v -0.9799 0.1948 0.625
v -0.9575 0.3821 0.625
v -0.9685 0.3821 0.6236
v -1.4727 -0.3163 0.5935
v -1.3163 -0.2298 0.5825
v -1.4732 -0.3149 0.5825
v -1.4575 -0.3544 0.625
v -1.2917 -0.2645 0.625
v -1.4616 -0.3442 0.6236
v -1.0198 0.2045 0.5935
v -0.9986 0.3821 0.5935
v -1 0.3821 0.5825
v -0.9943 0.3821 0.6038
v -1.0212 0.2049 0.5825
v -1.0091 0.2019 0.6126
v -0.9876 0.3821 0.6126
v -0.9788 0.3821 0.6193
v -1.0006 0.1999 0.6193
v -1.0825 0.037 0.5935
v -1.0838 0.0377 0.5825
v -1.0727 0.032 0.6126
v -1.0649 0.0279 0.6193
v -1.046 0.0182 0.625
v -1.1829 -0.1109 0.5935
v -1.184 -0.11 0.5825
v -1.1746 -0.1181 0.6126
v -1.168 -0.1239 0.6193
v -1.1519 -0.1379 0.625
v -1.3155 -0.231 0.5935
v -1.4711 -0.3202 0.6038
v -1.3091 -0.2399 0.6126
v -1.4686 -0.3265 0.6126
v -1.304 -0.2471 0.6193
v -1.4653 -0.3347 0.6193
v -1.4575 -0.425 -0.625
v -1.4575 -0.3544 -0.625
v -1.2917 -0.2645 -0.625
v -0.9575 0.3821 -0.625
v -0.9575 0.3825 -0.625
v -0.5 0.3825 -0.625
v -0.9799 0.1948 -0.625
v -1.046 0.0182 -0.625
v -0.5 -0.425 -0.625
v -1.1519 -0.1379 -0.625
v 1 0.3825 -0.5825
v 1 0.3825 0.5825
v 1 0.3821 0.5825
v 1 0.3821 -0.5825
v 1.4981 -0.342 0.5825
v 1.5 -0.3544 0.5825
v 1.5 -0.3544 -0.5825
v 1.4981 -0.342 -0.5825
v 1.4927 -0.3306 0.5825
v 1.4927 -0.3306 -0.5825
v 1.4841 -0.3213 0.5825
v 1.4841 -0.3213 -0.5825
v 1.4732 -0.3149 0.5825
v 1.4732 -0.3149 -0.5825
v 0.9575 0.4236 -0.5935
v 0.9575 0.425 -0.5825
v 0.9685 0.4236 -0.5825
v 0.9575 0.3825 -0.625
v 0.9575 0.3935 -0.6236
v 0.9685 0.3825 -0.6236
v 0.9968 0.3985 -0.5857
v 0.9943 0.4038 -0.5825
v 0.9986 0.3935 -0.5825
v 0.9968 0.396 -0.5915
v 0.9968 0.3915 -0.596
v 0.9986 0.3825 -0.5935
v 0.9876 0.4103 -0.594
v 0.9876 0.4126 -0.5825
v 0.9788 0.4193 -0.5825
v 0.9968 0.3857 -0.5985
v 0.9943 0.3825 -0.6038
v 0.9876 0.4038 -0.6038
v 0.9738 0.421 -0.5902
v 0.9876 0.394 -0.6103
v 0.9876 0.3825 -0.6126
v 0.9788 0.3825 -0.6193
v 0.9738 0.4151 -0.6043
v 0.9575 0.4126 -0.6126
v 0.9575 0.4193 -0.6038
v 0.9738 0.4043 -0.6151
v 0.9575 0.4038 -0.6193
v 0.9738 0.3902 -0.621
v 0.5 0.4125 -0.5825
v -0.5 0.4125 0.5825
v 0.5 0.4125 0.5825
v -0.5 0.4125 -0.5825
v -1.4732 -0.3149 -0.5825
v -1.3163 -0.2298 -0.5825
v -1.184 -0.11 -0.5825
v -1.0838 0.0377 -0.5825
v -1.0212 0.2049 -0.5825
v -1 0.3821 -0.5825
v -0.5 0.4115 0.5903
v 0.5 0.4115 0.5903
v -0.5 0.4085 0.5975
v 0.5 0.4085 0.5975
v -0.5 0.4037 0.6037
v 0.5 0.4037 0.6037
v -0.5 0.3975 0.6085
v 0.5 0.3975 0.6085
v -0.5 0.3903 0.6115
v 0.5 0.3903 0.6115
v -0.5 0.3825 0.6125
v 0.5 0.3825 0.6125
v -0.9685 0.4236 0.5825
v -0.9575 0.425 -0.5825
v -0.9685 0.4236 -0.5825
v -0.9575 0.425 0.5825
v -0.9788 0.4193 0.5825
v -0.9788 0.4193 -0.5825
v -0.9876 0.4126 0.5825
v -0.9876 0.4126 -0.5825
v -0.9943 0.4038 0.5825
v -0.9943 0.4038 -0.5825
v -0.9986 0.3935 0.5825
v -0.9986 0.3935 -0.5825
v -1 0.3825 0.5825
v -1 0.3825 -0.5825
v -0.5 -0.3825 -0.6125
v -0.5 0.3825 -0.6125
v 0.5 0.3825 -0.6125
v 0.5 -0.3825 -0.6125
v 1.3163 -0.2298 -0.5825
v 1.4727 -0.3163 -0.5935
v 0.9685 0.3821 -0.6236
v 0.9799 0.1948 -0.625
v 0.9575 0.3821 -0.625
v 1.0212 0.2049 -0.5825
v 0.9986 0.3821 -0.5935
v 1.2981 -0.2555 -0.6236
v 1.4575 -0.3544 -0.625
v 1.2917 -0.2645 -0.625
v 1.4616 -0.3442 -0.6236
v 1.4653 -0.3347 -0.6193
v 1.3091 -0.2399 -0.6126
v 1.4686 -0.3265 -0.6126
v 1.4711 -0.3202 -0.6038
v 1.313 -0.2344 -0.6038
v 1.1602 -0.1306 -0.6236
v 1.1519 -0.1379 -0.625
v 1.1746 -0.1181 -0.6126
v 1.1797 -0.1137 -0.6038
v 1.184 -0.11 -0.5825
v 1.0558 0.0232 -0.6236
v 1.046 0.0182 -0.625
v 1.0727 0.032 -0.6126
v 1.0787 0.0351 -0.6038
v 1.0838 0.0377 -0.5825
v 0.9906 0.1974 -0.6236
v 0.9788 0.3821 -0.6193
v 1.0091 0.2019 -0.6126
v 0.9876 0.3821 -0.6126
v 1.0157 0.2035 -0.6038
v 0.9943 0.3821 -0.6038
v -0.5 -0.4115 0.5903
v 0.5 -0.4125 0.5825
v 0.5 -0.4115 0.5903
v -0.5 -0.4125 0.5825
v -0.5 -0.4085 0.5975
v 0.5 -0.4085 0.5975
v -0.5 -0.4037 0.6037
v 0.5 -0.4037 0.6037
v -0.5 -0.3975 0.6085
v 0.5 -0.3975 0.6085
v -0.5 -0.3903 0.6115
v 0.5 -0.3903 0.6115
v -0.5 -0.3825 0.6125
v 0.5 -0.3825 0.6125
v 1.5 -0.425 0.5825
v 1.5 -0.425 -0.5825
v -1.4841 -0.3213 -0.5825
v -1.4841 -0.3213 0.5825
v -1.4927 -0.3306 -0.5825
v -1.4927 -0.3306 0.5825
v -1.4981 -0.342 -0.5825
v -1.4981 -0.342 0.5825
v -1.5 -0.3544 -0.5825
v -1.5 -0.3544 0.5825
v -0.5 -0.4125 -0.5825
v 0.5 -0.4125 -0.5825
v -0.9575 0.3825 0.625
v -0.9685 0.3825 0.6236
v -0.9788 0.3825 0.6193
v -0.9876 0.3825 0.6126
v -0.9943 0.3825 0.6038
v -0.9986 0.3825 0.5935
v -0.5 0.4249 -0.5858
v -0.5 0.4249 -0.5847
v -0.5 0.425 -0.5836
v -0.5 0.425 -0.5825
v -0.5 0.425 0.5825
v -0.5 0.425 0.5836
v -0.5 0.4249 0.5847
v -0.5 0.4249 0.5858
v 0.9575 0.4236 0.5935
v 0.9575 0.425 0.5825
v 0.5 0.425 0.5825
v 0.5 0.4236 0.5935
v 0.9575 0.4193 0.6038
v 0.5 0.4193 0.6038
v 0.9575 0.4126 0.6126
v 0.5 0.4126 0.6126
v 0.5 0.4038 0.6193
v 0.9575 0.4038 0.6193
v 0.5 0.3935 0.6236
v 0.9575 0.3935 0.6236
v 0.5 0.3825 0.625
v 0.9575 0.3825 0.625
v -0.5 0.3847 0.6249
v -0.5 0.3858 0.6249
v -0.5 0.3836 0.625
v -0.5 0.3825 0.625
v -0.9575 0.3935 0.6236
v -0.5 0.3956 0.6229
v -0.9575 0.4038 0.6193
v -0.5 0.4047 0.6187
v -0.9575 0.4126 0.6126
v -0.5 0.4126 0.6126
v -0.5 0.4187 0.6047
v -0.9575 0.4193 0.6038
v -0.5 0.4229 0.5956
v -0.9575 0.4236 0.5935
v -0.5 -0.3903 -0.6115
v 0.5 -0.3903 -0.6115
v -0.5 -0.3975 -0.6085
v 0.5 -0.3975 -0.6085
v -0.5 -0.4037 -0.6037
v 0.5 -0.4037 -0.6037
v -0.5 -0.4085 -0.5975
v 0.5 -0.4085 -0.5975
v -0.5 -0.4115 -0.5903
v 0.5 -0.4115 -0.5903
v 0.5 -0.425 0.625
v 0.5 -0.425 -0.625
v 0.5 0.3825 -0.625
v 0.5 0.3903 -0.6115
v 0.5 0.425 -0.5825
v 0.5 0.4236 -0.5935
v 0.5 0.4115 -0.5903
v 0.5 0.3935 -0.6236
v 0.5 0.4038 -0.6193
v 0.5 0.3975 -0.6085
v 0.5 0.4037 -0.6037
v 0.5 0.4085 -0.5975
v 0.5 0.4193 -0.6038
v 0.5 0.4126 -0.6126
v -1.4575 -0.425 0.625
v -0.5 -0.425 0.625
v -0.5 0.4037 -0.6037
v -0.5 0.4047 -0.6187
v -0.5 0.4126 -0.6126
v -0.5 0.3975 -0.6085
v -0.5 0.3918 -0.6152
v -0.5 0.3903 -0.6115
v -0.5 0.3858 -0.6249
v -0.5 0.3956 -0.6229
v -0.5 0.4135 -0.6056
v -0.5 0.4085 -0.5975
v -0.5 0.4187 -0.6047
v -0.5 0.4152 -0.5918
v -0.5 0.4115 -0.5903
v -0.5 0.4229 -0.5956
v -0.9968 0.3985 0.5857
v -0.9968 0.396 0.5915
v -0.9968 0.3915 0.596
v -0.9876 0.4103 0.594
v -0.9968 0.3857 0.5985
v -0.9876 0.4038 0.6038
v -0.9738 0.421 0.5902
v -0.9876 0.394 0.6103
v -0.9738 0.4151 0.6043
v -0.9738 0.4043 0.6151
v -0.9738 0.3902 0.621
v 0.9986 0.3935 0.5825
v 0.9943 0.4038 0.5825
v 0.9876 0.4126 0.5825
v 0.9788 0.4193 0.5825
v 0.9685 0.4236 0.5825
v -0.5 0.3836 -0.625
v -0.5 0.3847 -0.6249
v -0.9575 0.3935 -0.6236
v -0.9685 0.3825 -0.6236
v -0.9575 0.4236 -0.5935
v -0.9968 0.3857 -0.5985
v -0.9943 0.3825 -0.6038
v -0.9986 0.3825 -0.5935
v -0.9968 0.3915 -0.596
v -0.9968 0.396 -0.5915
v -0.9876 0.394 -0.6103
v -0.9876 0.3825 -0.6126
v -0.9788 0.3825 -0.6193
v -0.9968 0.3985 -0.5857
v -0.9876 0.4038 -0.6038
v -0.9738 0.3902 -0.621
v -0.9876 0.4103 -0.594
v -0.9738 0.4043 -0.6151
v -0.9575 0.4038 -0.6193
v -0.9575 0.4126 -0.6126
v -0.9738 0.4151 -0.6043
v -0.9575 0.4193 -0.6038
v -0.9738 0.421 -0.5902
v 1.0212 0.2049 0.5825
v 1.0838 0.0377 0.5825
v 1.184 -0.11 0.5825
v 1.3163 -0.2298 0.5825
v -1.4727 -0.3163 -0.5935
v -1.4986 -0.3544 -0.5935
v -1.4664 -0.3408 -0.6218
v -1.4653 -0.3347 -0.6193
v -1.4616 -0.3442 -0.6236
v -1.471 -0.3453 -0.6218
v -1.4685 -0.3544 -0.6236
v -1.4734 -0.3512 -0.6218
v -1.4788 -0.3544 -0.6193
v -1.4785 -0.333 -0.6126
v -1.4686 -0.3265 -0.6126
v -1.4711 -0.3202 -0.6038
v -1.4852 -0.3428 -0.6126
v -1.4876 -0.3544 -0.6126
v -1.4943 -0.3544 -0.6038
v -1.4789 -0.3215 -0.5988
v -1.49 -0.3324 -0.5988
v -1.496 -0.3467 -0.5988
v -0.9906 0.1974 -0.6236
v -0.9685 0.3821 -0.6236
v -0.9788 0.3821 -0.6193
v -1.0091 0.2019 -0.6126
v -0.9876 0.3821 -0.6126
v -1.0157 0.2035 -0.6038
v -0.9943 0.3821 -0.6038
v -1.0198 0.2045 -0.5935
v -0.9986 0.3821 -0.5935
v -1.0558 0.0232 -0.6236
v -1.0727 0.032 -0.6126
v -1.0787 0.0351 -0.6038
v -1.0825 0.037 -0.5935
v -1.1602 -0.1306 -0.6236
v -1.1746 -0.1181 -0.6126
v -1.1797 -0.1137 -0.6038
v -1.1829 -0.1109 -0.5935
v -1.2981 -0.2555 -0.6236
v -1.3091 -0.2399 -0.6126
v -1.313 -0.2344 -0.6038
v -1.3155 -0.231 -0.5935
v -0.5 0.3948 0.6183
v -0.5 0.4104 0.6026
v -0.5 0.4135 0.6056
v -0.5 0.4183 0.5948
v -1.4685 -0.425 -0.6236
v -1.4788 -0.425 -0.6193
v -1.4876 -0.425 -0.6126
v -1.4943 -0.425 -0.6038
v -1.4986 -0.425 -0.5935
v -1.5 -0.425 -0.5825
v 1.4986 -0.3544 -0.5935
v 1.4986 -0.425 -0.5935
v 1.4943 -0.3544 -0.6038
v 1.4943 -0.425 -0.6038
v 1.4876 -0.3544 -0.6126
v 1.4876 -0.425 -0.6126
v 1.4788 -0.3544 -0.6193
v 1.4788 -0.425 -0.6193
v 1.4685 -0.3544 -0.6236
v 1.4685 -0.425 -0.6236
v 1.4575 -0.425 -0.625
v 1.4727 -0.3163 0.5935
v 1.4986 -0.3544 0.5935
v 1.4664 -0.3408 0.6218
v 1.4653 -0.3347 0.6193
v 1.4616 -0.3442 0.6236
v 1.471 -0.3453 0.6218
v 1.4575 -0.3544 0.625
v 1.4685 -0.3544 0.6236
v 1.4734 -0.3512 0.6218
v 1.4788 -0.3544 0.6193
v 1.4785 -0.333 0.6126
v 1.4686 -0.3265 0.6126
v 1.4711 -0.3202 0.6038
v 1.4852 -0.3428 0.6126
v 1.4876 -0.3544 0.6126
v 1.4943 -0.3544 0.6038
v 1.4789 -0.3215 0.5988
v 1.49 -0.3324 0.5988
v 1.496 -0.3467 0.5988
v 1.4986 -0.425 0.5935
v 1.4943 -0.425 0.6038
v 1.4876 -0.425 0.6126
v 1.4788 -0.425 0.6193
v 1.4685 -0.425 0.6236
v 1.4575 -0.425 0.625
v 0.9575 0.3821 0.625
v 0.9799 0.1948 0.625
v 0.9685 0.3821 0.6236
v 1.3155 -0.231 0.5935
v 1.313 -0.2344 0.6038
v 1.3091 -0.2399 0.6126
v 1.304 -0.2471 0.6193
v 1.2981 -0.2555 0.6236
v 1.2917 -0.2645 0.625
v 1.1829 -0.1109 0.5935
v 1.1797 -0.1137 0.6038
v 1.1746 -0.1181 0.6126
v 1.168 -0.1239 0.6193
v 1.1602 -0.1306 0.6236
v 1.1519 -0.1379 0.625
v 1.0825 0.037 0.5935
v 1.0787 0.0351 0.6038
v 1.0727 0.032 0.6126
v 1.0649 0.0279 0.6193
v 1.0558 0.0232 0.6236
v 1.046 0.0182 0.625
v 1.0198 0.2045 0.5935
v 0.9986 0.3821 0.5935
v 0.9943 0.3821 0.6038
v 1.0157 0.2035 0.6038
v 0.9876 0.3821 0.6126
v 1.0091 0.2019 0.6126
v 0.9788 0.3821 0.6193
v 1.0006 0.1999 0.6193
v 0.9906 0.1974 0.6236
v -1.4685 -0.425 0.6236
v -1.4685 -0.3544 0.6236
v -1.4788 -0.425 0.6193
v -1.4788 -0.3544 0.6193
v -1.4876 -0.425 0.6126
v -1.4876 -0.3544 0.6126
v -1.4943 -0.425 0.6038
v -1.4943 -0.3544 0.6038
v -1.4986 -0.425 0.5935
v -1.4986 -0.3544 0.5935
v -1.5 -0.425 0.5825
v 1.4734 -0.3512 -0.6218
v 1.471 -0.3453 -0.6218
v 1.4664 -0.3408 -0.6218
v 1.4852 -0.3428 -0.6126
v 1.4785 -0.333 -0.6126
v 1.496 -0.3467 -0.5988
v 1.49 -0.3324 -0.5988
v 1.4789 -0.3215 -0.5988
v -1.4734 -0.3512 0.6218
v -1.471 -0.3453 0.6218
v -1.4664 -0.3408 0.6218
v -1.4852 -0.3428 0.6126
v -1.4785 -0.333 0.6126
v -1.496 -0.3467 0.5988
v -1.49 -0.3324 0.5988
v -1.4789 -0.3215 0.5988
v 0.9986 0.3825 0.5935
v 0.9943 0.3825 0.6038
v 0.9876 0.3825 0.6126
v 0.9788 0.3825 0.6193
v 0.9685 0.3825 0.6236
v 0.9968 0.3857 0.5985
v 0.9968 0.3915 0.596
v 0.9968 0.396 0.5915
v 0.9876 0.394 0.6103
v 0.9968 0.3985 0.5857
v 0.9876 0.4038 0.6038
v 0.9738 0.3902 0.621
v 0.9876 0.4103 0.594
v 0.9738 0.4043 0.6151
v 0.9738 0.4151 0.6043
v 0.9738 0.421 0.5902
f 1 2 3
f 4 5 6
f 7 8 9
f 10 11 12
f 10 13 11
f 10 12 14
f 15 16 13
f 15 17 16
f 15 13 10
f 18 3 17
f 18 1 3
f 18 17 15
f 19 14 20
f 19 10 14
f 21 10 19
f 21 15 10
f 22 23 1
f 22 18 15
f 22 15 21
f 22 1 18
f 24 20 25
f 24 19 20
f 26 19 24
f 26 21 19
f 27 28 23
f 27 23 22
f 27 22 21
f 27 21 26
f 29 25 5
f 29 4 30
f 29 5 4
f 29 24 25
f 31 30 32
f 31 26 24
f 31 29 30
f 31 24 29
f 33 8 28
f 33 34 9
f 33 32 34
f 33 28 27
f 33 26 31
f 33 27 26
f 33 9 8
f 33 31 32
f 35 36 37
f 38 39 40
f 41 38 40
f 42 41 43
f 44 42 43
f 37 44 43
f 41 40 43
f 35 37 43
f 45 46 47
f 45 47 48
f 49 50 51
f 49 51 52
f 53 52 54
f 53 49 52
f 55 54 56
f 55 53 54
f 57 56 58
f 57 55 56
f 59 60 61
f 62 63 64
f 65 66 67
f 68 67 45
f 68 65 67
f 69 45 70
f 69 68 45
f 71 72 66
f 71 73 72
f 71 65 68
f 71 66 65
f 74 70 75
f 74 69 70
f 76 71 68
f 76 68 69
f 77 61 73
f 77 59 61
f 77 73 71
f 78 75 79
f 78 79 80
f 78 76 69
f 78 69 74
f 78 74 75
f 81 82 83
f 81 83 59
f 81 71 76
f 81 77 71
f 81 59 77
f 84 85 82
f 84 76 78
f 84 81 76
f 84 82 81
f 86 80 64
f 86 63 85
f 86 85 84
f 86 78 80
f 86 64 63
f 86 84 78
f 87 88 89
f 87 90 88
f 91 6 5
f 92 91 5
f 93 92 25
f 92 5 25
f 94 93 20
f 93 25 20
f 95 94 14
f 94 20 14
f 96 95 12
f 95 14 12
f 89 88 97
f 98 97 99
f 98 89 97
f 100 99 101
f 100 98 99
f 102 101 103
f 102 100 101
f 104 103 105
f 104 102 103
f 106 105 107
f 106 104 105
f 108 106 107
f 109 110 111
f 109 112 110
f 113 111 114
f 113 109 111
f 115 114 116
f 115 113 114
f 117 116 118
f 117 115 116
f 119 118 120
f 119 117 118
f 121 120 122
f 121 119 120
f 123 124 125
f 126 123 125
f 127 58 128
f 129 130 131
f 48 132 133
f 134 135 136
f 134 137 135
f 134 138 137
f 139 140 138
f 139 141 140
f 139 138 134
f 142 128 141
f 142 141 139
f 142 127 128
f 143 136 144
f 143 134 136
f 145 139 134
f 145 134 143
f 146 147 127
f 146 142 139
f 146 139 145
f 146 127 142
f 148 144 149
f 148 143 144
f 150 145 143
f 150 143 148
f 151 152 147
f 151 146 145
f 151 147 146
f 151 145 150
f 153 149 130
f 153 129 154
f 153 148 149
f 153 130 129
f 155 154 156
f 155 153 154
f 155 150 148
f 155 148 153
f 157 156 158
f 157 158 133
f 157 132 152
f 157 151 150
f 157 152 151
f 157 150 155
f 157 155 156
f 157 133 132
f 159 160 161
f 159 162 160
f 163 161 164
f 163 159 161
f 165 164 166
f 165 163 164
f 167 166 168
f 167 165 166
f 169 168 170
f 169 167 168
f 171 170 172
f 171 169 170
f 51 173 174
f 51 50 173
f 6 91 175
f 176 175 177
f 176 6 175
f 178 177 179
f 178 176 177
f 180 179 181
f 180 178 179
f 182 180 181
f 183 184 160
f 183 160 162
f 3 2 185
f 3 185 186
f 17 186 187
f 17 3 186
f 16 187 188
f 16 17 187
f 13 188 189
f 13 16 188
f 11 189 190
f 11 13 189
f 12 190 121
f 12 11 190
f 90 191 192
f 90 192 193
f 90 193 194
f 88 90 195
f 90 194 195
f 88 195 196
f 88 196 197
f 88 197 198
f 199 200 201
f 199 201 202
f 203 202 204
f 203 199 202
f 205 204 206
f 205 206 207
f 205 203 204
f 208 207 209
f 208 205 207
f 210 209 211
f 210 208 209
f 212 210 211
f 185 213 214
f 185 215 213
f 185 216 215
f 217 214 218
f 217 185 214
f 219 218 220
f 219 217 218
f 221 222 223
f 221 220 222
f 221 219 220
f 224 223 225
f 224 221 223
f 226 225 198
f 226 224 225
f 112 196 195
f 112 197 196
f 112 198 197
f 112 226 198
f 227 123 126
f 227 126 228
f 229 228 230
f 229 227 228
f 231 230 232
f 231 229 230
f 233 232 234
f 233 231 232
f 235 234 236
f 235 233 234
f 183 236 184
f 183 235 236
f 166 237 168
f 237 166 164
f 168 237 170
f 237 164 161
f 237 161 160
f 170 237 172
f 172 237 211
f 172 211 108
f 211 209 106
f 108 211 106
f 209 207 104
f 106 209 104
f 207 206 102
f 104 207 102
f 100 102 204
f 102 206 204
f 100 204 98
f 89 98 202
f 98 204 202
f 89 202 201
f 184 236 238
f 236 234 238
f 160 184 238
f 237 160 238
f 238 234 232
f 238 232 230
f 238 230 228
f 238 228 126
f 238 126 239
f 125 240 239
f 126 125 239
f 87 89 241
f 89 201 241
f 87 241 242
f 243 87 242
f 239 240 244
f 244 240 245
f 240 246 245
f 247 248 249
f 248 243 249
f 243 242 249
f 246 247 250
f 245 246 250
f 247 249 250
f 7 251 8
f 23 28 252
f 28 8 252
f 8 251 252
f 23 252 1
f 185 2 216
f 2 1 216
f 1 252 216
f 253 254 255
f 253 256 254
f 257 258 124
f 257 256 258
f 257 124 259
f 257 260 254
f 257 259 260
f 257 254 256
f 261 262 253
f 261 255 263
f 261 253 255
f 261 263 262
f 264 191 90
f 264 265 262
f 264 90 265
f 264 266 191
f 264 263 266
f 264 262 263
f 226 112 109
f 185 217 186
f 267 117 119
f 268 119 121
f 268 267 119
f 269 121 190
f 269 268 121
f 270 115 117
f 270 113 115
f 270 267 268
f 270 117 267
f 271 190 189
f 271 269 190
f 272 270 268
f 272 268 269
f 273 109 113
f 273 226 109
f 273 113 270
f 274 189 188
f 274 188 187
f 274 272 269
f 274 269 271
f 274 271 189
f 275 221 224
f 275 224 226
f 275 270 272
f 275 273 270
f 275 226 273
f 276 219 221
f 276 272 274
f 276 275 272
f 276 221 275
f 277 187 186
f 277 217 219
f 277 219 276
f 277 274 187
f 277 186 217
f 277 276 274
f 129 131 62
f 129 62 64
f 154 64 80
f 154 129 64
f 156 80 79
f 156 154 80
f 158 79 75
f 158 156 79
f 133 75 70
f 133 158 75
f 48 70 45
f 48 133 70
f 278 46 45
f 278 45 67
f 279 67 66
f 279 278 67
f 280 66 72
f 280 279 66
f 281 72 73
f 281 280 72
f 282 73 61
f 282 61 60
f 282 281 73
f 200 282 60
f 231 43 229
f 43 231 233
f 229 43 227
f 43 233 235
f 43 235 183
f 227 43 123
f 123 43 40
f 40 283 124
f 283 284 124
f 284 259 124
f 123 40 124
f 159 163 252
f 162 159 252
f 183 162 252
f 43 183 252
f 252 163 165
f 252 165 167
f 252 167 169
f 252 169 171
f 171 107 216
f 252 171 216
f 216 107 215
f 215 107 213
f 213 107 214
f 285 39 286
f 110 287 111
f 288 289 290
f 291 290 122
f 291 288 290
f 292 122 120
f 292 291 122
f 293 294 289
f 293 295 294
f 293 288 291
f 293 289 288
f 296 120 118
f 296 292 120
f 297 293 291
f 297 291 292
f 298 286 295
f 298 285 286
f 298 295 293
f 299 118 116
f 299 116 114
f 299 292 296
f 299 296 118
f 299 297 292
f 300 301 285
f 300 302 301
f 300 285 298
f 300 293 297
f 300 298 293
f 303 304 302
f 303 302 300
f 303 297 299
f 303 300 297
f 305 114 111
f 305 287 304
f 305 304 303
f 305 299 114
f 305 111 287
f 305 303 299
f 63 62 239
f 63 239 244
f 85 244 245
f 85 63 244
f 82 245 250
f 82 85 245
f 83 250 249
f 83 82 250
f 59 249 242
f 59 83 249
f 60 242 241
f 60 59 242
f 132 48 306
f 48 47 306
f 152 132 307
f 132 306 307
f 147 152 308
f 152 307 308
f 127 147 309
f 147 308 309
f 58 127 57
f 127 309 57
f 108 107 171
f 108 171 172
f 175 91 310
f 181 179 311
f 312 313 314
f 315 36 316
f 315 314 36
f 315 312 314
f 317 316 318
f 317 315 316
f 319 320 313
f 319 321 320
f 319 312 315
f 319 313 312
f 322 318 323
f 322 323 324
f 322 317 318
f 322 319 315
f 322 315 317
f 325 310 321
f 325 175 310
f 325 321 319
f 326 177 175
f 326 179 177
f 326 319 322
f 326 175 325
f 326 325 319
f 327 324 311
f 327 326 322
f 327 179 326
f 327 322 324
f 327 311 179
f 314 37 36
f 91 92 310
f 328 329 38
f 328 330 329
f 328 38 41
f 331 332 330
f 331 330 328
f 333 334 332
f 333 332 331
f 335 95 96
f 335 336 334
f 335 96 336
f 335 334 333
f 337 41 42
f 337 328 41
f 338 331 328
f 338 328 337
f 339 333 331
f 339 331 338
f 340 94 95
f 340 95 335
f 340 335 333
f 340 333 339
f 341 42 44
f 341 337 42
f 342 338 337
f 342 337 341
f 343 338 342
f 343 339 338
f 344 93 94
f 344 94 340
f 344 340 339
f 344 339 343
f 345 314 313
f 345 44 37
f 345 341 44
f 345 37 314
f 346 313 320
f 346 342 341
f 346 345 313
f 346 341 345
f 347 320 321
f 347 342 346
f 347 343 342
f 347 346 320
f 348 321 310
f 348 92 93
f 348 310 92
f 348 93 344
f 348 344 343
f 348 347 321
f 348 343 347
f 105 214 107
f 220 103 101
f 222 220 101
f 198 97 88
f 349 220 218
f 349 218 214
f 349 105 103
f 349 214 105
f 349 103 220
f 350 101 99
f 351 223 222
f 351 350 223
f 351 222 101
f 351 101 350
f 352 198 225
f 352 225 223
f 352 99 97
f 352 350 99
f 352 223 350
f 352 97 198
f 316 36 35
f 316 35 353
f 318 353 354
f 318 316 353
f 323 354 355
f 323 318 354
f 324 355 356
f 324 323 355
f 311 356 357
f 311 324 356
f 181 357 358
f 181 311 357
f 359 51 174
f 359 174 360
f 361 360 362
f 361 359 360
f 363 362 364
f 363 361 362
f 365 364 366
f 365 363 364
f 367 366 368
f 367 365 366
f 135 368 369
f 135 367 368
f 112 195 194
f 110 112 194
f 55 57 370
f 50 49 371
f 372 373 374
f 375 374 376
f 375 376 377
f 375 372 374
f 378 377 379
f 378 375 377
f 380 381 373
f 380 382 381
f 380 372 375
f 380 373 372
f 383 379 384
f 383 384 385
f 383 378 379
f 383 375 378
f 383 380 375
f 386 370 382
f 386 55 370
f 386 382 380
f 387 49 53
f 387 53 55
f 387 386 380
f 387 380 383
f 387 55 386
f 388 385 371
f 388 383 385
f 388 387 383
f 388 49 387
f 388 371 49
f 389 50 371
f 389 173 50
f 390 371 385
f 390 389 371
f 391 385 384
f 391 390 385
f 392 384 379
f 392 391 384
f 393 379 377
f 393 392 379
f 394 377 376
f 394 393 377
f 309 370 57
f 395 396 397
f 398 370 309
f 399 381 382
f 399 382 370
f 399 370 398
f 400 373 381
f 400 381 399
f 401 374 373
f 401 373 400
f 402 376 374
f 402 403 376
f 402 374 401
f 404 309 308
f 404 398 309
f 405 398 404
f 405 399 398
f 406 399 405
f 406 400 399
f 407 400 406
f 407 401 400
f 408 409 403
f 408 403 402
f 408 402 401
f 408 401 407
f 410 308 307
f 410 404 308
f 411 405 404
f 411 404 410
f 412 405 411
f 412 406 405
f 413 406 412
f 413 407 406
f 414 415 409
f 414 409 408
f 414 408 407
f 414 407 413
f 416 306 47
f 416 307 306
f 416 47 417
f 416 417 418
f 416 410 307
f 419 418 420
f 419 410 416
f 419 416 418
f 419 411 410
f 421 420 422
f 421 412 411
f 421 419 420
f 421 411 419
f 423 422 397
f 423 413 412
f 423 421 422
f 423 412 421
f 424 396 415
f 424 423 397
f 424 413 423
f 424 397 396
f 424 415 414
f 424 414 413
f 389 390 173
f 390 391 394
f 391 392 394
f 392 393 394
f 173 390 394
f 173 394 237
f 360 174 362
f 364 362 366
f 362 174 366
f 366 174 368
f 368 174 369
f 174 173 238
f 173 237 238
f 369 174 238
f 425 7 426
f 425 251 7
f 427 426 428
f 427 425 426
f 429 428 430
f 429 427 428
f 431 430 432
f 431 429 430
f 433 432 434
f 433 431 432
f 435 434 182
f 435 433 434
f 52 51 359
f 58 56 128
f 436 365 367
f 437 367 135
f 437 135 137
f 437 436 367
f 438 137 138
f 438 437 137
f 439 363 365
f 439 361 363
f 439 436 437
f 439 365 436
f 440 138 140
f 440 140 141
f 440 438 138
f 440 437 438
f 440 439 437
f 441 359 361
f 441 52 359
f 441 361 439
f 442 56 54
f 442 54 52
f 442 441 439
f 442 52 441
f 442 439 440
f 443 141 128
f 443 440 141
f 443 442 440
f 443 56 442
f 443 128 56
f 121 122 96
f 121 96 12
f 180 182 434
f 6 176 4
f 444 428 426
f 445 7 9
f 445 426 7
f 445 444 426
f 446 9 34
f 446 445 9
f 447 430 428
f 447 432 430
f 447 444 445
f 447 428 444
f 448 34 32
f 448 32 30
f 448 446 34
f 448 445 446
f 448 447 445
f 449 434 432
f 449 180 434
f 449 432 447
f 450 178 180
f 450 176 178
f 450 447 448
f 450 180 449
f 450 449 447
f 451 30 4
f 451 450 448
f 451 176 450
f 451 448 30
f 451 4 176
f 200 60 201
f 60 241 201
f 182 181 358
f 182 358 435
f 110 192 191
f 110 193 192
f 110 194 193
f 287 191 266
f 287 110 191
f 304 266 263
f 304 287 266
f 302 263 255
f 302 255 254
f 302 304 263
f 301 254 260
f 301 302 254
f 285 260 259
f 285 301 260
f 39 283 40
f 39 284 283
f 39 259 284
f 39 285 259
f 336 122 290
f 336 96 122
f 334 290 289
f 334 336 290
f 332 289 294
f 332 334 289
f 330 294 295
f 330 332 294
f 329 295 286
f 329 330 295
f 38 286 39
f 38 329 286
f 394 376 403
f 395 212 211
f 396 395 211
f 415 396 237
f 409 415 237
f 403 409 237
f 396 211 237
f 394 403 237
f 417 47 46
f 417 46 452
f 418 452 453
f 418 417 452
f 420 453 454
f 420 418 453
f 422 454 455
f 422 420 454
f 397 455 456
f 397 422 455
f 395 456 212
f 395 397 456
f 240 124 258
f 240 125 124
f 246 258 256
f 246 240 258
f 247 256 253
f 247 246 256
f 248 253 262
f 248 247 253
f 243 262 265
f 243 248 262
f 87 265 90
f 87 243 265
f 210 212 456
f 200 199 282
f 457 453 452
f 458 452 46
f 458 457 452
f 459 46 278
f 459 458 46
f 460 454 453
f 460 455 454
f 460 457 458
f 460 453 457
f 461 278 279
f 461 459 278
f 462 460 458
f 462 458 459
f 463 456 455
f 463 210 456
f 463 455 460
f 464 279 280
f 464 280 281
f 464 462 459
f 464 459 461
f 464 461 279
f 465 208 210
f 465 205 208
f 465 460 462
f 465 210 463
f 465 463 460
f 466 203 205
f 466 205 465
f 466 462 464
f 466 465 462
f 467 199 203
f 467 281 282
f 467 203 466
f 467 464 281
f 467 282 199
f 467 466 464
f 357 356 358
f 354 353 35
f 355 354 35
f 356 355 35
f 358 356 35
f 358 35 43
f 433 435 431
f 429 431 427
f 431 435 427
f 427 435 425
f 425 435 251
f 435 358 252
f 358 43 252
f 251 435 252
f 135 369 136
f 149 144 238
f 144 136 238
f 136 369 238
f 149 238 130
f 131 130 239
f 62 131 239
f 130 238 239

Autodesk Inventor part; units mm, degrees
ref_plane "YZ Plane" through (0, 0, 0) normal (1, 0, 0) x (0, 1, 0)
ref_plane "XZ Plane" through (0, 0, 0) normal (0, 1, 0) x (-1, 0, 0)
ref_plane "XY Plane" through (0, 0, 0) normal (0, 0, 1) x (1, 0, 0)
sketch "Sketch10" plane through (0, 0, 0) normal (0, 0, 1) x (1, 0, 0)
  line L0 (-0.5, 0.4125) -> (0.5, 0.4125)
  line L1 (0.5, 0.4125) -> (0.5, -0.4125)
  line L2 (0.5, -0.4125) -> (-0.5, -0.4125)
  line L3 (-0.5, -0.4125) -> (-0.5, 0.4125)
  point P0 (0, 0)
  point P1 (-0.5, 0)
  point P2 (0, 0.4125)
  dimension "d7" = 1
  dimension "d8" = 0.825
extrude "Extrusion4" add sketch "Sketch10" along normal mid plane 1.225
sketch "Sketch11" plane through (0.5, -0.4125, 0.6125) normal (1, 0, 0) x (0, 0, -1)
  line L0 (0, 0.825) -> (1.225, 0.825) construction
  line L1 (0, 0) -> (0, 0.825) construction
  line L2 (0, 0) -> (1.225, 0) construction
  line L3 (1.225, 0.825) -> (1.225, 0) construction
  line L4 (1.2375, 0.8375) -> (-0.0125, 0.8375)
  line L5 (-0.0125, 0.8375) -> (-0.0125, -0.0125)
  line L6 (-0.0125, -0.0125) -> (1.2375, -0.0125)
  line L7 (1.2375, -0.0125) -> (1.2375, 0.8375)
  line L8 (-0.0125, -0.0125) -> (1.2375, -0.0125)
  line L9 (1.2375, -0.0125) -> (1.2375, 0.0875)
  line L10 (1.2375, 0.0875) -> (-0.0125, 0.0875)
  line L11 (-0.0125, 0.0875) -> (-0.0125, -0.0125)
  point P0 (0.6125, 0.4125)
  dimension "d11" = 1.25
  dimension "d14" = 0.1
extrude "Extrusion5" add sketch "Sketch11" along normal blind 0.5
extrude "Extrusion6" add sketch "Sketch11" along normal blind 1 contours L7 L6 L5 L10
fillet "Fillet1" radius 0.75 1 edges at (1, -0.325, 0)
fillet "Fillet2" radius 0.0425 10 edges at (0.75, 0.425, -0.625) (0.75, 0.425, 0.625) (1, 0.4036, 0.625) (1.1376, -0.0509, 0.625) (1, 0.4036, -0.625) (1.1376, -0.0509, -0.625) (1.5, -0.375, -0.625) (1.5, -0.325, 0) (1, 0.425, 0) (1.5, -0.375, 0.625)
mirror "Mirror1" about plane through (0, 0, 0) normal (1, 0, 0) of "Extrusion5", "Fillet1", "Fillet2", "Extrusion6"
fillet "Fillet3" radius 0.03 4 edges at (0, 0.4125, -0.6125) (0, 0.4125, 0.6125) (0, -0.4125, -0.6125) (0, -0.4125, 0.6125)
properties part number "CL21A226MQCLQNC Capacitor" material "Laminate, Ivory, Matte"
